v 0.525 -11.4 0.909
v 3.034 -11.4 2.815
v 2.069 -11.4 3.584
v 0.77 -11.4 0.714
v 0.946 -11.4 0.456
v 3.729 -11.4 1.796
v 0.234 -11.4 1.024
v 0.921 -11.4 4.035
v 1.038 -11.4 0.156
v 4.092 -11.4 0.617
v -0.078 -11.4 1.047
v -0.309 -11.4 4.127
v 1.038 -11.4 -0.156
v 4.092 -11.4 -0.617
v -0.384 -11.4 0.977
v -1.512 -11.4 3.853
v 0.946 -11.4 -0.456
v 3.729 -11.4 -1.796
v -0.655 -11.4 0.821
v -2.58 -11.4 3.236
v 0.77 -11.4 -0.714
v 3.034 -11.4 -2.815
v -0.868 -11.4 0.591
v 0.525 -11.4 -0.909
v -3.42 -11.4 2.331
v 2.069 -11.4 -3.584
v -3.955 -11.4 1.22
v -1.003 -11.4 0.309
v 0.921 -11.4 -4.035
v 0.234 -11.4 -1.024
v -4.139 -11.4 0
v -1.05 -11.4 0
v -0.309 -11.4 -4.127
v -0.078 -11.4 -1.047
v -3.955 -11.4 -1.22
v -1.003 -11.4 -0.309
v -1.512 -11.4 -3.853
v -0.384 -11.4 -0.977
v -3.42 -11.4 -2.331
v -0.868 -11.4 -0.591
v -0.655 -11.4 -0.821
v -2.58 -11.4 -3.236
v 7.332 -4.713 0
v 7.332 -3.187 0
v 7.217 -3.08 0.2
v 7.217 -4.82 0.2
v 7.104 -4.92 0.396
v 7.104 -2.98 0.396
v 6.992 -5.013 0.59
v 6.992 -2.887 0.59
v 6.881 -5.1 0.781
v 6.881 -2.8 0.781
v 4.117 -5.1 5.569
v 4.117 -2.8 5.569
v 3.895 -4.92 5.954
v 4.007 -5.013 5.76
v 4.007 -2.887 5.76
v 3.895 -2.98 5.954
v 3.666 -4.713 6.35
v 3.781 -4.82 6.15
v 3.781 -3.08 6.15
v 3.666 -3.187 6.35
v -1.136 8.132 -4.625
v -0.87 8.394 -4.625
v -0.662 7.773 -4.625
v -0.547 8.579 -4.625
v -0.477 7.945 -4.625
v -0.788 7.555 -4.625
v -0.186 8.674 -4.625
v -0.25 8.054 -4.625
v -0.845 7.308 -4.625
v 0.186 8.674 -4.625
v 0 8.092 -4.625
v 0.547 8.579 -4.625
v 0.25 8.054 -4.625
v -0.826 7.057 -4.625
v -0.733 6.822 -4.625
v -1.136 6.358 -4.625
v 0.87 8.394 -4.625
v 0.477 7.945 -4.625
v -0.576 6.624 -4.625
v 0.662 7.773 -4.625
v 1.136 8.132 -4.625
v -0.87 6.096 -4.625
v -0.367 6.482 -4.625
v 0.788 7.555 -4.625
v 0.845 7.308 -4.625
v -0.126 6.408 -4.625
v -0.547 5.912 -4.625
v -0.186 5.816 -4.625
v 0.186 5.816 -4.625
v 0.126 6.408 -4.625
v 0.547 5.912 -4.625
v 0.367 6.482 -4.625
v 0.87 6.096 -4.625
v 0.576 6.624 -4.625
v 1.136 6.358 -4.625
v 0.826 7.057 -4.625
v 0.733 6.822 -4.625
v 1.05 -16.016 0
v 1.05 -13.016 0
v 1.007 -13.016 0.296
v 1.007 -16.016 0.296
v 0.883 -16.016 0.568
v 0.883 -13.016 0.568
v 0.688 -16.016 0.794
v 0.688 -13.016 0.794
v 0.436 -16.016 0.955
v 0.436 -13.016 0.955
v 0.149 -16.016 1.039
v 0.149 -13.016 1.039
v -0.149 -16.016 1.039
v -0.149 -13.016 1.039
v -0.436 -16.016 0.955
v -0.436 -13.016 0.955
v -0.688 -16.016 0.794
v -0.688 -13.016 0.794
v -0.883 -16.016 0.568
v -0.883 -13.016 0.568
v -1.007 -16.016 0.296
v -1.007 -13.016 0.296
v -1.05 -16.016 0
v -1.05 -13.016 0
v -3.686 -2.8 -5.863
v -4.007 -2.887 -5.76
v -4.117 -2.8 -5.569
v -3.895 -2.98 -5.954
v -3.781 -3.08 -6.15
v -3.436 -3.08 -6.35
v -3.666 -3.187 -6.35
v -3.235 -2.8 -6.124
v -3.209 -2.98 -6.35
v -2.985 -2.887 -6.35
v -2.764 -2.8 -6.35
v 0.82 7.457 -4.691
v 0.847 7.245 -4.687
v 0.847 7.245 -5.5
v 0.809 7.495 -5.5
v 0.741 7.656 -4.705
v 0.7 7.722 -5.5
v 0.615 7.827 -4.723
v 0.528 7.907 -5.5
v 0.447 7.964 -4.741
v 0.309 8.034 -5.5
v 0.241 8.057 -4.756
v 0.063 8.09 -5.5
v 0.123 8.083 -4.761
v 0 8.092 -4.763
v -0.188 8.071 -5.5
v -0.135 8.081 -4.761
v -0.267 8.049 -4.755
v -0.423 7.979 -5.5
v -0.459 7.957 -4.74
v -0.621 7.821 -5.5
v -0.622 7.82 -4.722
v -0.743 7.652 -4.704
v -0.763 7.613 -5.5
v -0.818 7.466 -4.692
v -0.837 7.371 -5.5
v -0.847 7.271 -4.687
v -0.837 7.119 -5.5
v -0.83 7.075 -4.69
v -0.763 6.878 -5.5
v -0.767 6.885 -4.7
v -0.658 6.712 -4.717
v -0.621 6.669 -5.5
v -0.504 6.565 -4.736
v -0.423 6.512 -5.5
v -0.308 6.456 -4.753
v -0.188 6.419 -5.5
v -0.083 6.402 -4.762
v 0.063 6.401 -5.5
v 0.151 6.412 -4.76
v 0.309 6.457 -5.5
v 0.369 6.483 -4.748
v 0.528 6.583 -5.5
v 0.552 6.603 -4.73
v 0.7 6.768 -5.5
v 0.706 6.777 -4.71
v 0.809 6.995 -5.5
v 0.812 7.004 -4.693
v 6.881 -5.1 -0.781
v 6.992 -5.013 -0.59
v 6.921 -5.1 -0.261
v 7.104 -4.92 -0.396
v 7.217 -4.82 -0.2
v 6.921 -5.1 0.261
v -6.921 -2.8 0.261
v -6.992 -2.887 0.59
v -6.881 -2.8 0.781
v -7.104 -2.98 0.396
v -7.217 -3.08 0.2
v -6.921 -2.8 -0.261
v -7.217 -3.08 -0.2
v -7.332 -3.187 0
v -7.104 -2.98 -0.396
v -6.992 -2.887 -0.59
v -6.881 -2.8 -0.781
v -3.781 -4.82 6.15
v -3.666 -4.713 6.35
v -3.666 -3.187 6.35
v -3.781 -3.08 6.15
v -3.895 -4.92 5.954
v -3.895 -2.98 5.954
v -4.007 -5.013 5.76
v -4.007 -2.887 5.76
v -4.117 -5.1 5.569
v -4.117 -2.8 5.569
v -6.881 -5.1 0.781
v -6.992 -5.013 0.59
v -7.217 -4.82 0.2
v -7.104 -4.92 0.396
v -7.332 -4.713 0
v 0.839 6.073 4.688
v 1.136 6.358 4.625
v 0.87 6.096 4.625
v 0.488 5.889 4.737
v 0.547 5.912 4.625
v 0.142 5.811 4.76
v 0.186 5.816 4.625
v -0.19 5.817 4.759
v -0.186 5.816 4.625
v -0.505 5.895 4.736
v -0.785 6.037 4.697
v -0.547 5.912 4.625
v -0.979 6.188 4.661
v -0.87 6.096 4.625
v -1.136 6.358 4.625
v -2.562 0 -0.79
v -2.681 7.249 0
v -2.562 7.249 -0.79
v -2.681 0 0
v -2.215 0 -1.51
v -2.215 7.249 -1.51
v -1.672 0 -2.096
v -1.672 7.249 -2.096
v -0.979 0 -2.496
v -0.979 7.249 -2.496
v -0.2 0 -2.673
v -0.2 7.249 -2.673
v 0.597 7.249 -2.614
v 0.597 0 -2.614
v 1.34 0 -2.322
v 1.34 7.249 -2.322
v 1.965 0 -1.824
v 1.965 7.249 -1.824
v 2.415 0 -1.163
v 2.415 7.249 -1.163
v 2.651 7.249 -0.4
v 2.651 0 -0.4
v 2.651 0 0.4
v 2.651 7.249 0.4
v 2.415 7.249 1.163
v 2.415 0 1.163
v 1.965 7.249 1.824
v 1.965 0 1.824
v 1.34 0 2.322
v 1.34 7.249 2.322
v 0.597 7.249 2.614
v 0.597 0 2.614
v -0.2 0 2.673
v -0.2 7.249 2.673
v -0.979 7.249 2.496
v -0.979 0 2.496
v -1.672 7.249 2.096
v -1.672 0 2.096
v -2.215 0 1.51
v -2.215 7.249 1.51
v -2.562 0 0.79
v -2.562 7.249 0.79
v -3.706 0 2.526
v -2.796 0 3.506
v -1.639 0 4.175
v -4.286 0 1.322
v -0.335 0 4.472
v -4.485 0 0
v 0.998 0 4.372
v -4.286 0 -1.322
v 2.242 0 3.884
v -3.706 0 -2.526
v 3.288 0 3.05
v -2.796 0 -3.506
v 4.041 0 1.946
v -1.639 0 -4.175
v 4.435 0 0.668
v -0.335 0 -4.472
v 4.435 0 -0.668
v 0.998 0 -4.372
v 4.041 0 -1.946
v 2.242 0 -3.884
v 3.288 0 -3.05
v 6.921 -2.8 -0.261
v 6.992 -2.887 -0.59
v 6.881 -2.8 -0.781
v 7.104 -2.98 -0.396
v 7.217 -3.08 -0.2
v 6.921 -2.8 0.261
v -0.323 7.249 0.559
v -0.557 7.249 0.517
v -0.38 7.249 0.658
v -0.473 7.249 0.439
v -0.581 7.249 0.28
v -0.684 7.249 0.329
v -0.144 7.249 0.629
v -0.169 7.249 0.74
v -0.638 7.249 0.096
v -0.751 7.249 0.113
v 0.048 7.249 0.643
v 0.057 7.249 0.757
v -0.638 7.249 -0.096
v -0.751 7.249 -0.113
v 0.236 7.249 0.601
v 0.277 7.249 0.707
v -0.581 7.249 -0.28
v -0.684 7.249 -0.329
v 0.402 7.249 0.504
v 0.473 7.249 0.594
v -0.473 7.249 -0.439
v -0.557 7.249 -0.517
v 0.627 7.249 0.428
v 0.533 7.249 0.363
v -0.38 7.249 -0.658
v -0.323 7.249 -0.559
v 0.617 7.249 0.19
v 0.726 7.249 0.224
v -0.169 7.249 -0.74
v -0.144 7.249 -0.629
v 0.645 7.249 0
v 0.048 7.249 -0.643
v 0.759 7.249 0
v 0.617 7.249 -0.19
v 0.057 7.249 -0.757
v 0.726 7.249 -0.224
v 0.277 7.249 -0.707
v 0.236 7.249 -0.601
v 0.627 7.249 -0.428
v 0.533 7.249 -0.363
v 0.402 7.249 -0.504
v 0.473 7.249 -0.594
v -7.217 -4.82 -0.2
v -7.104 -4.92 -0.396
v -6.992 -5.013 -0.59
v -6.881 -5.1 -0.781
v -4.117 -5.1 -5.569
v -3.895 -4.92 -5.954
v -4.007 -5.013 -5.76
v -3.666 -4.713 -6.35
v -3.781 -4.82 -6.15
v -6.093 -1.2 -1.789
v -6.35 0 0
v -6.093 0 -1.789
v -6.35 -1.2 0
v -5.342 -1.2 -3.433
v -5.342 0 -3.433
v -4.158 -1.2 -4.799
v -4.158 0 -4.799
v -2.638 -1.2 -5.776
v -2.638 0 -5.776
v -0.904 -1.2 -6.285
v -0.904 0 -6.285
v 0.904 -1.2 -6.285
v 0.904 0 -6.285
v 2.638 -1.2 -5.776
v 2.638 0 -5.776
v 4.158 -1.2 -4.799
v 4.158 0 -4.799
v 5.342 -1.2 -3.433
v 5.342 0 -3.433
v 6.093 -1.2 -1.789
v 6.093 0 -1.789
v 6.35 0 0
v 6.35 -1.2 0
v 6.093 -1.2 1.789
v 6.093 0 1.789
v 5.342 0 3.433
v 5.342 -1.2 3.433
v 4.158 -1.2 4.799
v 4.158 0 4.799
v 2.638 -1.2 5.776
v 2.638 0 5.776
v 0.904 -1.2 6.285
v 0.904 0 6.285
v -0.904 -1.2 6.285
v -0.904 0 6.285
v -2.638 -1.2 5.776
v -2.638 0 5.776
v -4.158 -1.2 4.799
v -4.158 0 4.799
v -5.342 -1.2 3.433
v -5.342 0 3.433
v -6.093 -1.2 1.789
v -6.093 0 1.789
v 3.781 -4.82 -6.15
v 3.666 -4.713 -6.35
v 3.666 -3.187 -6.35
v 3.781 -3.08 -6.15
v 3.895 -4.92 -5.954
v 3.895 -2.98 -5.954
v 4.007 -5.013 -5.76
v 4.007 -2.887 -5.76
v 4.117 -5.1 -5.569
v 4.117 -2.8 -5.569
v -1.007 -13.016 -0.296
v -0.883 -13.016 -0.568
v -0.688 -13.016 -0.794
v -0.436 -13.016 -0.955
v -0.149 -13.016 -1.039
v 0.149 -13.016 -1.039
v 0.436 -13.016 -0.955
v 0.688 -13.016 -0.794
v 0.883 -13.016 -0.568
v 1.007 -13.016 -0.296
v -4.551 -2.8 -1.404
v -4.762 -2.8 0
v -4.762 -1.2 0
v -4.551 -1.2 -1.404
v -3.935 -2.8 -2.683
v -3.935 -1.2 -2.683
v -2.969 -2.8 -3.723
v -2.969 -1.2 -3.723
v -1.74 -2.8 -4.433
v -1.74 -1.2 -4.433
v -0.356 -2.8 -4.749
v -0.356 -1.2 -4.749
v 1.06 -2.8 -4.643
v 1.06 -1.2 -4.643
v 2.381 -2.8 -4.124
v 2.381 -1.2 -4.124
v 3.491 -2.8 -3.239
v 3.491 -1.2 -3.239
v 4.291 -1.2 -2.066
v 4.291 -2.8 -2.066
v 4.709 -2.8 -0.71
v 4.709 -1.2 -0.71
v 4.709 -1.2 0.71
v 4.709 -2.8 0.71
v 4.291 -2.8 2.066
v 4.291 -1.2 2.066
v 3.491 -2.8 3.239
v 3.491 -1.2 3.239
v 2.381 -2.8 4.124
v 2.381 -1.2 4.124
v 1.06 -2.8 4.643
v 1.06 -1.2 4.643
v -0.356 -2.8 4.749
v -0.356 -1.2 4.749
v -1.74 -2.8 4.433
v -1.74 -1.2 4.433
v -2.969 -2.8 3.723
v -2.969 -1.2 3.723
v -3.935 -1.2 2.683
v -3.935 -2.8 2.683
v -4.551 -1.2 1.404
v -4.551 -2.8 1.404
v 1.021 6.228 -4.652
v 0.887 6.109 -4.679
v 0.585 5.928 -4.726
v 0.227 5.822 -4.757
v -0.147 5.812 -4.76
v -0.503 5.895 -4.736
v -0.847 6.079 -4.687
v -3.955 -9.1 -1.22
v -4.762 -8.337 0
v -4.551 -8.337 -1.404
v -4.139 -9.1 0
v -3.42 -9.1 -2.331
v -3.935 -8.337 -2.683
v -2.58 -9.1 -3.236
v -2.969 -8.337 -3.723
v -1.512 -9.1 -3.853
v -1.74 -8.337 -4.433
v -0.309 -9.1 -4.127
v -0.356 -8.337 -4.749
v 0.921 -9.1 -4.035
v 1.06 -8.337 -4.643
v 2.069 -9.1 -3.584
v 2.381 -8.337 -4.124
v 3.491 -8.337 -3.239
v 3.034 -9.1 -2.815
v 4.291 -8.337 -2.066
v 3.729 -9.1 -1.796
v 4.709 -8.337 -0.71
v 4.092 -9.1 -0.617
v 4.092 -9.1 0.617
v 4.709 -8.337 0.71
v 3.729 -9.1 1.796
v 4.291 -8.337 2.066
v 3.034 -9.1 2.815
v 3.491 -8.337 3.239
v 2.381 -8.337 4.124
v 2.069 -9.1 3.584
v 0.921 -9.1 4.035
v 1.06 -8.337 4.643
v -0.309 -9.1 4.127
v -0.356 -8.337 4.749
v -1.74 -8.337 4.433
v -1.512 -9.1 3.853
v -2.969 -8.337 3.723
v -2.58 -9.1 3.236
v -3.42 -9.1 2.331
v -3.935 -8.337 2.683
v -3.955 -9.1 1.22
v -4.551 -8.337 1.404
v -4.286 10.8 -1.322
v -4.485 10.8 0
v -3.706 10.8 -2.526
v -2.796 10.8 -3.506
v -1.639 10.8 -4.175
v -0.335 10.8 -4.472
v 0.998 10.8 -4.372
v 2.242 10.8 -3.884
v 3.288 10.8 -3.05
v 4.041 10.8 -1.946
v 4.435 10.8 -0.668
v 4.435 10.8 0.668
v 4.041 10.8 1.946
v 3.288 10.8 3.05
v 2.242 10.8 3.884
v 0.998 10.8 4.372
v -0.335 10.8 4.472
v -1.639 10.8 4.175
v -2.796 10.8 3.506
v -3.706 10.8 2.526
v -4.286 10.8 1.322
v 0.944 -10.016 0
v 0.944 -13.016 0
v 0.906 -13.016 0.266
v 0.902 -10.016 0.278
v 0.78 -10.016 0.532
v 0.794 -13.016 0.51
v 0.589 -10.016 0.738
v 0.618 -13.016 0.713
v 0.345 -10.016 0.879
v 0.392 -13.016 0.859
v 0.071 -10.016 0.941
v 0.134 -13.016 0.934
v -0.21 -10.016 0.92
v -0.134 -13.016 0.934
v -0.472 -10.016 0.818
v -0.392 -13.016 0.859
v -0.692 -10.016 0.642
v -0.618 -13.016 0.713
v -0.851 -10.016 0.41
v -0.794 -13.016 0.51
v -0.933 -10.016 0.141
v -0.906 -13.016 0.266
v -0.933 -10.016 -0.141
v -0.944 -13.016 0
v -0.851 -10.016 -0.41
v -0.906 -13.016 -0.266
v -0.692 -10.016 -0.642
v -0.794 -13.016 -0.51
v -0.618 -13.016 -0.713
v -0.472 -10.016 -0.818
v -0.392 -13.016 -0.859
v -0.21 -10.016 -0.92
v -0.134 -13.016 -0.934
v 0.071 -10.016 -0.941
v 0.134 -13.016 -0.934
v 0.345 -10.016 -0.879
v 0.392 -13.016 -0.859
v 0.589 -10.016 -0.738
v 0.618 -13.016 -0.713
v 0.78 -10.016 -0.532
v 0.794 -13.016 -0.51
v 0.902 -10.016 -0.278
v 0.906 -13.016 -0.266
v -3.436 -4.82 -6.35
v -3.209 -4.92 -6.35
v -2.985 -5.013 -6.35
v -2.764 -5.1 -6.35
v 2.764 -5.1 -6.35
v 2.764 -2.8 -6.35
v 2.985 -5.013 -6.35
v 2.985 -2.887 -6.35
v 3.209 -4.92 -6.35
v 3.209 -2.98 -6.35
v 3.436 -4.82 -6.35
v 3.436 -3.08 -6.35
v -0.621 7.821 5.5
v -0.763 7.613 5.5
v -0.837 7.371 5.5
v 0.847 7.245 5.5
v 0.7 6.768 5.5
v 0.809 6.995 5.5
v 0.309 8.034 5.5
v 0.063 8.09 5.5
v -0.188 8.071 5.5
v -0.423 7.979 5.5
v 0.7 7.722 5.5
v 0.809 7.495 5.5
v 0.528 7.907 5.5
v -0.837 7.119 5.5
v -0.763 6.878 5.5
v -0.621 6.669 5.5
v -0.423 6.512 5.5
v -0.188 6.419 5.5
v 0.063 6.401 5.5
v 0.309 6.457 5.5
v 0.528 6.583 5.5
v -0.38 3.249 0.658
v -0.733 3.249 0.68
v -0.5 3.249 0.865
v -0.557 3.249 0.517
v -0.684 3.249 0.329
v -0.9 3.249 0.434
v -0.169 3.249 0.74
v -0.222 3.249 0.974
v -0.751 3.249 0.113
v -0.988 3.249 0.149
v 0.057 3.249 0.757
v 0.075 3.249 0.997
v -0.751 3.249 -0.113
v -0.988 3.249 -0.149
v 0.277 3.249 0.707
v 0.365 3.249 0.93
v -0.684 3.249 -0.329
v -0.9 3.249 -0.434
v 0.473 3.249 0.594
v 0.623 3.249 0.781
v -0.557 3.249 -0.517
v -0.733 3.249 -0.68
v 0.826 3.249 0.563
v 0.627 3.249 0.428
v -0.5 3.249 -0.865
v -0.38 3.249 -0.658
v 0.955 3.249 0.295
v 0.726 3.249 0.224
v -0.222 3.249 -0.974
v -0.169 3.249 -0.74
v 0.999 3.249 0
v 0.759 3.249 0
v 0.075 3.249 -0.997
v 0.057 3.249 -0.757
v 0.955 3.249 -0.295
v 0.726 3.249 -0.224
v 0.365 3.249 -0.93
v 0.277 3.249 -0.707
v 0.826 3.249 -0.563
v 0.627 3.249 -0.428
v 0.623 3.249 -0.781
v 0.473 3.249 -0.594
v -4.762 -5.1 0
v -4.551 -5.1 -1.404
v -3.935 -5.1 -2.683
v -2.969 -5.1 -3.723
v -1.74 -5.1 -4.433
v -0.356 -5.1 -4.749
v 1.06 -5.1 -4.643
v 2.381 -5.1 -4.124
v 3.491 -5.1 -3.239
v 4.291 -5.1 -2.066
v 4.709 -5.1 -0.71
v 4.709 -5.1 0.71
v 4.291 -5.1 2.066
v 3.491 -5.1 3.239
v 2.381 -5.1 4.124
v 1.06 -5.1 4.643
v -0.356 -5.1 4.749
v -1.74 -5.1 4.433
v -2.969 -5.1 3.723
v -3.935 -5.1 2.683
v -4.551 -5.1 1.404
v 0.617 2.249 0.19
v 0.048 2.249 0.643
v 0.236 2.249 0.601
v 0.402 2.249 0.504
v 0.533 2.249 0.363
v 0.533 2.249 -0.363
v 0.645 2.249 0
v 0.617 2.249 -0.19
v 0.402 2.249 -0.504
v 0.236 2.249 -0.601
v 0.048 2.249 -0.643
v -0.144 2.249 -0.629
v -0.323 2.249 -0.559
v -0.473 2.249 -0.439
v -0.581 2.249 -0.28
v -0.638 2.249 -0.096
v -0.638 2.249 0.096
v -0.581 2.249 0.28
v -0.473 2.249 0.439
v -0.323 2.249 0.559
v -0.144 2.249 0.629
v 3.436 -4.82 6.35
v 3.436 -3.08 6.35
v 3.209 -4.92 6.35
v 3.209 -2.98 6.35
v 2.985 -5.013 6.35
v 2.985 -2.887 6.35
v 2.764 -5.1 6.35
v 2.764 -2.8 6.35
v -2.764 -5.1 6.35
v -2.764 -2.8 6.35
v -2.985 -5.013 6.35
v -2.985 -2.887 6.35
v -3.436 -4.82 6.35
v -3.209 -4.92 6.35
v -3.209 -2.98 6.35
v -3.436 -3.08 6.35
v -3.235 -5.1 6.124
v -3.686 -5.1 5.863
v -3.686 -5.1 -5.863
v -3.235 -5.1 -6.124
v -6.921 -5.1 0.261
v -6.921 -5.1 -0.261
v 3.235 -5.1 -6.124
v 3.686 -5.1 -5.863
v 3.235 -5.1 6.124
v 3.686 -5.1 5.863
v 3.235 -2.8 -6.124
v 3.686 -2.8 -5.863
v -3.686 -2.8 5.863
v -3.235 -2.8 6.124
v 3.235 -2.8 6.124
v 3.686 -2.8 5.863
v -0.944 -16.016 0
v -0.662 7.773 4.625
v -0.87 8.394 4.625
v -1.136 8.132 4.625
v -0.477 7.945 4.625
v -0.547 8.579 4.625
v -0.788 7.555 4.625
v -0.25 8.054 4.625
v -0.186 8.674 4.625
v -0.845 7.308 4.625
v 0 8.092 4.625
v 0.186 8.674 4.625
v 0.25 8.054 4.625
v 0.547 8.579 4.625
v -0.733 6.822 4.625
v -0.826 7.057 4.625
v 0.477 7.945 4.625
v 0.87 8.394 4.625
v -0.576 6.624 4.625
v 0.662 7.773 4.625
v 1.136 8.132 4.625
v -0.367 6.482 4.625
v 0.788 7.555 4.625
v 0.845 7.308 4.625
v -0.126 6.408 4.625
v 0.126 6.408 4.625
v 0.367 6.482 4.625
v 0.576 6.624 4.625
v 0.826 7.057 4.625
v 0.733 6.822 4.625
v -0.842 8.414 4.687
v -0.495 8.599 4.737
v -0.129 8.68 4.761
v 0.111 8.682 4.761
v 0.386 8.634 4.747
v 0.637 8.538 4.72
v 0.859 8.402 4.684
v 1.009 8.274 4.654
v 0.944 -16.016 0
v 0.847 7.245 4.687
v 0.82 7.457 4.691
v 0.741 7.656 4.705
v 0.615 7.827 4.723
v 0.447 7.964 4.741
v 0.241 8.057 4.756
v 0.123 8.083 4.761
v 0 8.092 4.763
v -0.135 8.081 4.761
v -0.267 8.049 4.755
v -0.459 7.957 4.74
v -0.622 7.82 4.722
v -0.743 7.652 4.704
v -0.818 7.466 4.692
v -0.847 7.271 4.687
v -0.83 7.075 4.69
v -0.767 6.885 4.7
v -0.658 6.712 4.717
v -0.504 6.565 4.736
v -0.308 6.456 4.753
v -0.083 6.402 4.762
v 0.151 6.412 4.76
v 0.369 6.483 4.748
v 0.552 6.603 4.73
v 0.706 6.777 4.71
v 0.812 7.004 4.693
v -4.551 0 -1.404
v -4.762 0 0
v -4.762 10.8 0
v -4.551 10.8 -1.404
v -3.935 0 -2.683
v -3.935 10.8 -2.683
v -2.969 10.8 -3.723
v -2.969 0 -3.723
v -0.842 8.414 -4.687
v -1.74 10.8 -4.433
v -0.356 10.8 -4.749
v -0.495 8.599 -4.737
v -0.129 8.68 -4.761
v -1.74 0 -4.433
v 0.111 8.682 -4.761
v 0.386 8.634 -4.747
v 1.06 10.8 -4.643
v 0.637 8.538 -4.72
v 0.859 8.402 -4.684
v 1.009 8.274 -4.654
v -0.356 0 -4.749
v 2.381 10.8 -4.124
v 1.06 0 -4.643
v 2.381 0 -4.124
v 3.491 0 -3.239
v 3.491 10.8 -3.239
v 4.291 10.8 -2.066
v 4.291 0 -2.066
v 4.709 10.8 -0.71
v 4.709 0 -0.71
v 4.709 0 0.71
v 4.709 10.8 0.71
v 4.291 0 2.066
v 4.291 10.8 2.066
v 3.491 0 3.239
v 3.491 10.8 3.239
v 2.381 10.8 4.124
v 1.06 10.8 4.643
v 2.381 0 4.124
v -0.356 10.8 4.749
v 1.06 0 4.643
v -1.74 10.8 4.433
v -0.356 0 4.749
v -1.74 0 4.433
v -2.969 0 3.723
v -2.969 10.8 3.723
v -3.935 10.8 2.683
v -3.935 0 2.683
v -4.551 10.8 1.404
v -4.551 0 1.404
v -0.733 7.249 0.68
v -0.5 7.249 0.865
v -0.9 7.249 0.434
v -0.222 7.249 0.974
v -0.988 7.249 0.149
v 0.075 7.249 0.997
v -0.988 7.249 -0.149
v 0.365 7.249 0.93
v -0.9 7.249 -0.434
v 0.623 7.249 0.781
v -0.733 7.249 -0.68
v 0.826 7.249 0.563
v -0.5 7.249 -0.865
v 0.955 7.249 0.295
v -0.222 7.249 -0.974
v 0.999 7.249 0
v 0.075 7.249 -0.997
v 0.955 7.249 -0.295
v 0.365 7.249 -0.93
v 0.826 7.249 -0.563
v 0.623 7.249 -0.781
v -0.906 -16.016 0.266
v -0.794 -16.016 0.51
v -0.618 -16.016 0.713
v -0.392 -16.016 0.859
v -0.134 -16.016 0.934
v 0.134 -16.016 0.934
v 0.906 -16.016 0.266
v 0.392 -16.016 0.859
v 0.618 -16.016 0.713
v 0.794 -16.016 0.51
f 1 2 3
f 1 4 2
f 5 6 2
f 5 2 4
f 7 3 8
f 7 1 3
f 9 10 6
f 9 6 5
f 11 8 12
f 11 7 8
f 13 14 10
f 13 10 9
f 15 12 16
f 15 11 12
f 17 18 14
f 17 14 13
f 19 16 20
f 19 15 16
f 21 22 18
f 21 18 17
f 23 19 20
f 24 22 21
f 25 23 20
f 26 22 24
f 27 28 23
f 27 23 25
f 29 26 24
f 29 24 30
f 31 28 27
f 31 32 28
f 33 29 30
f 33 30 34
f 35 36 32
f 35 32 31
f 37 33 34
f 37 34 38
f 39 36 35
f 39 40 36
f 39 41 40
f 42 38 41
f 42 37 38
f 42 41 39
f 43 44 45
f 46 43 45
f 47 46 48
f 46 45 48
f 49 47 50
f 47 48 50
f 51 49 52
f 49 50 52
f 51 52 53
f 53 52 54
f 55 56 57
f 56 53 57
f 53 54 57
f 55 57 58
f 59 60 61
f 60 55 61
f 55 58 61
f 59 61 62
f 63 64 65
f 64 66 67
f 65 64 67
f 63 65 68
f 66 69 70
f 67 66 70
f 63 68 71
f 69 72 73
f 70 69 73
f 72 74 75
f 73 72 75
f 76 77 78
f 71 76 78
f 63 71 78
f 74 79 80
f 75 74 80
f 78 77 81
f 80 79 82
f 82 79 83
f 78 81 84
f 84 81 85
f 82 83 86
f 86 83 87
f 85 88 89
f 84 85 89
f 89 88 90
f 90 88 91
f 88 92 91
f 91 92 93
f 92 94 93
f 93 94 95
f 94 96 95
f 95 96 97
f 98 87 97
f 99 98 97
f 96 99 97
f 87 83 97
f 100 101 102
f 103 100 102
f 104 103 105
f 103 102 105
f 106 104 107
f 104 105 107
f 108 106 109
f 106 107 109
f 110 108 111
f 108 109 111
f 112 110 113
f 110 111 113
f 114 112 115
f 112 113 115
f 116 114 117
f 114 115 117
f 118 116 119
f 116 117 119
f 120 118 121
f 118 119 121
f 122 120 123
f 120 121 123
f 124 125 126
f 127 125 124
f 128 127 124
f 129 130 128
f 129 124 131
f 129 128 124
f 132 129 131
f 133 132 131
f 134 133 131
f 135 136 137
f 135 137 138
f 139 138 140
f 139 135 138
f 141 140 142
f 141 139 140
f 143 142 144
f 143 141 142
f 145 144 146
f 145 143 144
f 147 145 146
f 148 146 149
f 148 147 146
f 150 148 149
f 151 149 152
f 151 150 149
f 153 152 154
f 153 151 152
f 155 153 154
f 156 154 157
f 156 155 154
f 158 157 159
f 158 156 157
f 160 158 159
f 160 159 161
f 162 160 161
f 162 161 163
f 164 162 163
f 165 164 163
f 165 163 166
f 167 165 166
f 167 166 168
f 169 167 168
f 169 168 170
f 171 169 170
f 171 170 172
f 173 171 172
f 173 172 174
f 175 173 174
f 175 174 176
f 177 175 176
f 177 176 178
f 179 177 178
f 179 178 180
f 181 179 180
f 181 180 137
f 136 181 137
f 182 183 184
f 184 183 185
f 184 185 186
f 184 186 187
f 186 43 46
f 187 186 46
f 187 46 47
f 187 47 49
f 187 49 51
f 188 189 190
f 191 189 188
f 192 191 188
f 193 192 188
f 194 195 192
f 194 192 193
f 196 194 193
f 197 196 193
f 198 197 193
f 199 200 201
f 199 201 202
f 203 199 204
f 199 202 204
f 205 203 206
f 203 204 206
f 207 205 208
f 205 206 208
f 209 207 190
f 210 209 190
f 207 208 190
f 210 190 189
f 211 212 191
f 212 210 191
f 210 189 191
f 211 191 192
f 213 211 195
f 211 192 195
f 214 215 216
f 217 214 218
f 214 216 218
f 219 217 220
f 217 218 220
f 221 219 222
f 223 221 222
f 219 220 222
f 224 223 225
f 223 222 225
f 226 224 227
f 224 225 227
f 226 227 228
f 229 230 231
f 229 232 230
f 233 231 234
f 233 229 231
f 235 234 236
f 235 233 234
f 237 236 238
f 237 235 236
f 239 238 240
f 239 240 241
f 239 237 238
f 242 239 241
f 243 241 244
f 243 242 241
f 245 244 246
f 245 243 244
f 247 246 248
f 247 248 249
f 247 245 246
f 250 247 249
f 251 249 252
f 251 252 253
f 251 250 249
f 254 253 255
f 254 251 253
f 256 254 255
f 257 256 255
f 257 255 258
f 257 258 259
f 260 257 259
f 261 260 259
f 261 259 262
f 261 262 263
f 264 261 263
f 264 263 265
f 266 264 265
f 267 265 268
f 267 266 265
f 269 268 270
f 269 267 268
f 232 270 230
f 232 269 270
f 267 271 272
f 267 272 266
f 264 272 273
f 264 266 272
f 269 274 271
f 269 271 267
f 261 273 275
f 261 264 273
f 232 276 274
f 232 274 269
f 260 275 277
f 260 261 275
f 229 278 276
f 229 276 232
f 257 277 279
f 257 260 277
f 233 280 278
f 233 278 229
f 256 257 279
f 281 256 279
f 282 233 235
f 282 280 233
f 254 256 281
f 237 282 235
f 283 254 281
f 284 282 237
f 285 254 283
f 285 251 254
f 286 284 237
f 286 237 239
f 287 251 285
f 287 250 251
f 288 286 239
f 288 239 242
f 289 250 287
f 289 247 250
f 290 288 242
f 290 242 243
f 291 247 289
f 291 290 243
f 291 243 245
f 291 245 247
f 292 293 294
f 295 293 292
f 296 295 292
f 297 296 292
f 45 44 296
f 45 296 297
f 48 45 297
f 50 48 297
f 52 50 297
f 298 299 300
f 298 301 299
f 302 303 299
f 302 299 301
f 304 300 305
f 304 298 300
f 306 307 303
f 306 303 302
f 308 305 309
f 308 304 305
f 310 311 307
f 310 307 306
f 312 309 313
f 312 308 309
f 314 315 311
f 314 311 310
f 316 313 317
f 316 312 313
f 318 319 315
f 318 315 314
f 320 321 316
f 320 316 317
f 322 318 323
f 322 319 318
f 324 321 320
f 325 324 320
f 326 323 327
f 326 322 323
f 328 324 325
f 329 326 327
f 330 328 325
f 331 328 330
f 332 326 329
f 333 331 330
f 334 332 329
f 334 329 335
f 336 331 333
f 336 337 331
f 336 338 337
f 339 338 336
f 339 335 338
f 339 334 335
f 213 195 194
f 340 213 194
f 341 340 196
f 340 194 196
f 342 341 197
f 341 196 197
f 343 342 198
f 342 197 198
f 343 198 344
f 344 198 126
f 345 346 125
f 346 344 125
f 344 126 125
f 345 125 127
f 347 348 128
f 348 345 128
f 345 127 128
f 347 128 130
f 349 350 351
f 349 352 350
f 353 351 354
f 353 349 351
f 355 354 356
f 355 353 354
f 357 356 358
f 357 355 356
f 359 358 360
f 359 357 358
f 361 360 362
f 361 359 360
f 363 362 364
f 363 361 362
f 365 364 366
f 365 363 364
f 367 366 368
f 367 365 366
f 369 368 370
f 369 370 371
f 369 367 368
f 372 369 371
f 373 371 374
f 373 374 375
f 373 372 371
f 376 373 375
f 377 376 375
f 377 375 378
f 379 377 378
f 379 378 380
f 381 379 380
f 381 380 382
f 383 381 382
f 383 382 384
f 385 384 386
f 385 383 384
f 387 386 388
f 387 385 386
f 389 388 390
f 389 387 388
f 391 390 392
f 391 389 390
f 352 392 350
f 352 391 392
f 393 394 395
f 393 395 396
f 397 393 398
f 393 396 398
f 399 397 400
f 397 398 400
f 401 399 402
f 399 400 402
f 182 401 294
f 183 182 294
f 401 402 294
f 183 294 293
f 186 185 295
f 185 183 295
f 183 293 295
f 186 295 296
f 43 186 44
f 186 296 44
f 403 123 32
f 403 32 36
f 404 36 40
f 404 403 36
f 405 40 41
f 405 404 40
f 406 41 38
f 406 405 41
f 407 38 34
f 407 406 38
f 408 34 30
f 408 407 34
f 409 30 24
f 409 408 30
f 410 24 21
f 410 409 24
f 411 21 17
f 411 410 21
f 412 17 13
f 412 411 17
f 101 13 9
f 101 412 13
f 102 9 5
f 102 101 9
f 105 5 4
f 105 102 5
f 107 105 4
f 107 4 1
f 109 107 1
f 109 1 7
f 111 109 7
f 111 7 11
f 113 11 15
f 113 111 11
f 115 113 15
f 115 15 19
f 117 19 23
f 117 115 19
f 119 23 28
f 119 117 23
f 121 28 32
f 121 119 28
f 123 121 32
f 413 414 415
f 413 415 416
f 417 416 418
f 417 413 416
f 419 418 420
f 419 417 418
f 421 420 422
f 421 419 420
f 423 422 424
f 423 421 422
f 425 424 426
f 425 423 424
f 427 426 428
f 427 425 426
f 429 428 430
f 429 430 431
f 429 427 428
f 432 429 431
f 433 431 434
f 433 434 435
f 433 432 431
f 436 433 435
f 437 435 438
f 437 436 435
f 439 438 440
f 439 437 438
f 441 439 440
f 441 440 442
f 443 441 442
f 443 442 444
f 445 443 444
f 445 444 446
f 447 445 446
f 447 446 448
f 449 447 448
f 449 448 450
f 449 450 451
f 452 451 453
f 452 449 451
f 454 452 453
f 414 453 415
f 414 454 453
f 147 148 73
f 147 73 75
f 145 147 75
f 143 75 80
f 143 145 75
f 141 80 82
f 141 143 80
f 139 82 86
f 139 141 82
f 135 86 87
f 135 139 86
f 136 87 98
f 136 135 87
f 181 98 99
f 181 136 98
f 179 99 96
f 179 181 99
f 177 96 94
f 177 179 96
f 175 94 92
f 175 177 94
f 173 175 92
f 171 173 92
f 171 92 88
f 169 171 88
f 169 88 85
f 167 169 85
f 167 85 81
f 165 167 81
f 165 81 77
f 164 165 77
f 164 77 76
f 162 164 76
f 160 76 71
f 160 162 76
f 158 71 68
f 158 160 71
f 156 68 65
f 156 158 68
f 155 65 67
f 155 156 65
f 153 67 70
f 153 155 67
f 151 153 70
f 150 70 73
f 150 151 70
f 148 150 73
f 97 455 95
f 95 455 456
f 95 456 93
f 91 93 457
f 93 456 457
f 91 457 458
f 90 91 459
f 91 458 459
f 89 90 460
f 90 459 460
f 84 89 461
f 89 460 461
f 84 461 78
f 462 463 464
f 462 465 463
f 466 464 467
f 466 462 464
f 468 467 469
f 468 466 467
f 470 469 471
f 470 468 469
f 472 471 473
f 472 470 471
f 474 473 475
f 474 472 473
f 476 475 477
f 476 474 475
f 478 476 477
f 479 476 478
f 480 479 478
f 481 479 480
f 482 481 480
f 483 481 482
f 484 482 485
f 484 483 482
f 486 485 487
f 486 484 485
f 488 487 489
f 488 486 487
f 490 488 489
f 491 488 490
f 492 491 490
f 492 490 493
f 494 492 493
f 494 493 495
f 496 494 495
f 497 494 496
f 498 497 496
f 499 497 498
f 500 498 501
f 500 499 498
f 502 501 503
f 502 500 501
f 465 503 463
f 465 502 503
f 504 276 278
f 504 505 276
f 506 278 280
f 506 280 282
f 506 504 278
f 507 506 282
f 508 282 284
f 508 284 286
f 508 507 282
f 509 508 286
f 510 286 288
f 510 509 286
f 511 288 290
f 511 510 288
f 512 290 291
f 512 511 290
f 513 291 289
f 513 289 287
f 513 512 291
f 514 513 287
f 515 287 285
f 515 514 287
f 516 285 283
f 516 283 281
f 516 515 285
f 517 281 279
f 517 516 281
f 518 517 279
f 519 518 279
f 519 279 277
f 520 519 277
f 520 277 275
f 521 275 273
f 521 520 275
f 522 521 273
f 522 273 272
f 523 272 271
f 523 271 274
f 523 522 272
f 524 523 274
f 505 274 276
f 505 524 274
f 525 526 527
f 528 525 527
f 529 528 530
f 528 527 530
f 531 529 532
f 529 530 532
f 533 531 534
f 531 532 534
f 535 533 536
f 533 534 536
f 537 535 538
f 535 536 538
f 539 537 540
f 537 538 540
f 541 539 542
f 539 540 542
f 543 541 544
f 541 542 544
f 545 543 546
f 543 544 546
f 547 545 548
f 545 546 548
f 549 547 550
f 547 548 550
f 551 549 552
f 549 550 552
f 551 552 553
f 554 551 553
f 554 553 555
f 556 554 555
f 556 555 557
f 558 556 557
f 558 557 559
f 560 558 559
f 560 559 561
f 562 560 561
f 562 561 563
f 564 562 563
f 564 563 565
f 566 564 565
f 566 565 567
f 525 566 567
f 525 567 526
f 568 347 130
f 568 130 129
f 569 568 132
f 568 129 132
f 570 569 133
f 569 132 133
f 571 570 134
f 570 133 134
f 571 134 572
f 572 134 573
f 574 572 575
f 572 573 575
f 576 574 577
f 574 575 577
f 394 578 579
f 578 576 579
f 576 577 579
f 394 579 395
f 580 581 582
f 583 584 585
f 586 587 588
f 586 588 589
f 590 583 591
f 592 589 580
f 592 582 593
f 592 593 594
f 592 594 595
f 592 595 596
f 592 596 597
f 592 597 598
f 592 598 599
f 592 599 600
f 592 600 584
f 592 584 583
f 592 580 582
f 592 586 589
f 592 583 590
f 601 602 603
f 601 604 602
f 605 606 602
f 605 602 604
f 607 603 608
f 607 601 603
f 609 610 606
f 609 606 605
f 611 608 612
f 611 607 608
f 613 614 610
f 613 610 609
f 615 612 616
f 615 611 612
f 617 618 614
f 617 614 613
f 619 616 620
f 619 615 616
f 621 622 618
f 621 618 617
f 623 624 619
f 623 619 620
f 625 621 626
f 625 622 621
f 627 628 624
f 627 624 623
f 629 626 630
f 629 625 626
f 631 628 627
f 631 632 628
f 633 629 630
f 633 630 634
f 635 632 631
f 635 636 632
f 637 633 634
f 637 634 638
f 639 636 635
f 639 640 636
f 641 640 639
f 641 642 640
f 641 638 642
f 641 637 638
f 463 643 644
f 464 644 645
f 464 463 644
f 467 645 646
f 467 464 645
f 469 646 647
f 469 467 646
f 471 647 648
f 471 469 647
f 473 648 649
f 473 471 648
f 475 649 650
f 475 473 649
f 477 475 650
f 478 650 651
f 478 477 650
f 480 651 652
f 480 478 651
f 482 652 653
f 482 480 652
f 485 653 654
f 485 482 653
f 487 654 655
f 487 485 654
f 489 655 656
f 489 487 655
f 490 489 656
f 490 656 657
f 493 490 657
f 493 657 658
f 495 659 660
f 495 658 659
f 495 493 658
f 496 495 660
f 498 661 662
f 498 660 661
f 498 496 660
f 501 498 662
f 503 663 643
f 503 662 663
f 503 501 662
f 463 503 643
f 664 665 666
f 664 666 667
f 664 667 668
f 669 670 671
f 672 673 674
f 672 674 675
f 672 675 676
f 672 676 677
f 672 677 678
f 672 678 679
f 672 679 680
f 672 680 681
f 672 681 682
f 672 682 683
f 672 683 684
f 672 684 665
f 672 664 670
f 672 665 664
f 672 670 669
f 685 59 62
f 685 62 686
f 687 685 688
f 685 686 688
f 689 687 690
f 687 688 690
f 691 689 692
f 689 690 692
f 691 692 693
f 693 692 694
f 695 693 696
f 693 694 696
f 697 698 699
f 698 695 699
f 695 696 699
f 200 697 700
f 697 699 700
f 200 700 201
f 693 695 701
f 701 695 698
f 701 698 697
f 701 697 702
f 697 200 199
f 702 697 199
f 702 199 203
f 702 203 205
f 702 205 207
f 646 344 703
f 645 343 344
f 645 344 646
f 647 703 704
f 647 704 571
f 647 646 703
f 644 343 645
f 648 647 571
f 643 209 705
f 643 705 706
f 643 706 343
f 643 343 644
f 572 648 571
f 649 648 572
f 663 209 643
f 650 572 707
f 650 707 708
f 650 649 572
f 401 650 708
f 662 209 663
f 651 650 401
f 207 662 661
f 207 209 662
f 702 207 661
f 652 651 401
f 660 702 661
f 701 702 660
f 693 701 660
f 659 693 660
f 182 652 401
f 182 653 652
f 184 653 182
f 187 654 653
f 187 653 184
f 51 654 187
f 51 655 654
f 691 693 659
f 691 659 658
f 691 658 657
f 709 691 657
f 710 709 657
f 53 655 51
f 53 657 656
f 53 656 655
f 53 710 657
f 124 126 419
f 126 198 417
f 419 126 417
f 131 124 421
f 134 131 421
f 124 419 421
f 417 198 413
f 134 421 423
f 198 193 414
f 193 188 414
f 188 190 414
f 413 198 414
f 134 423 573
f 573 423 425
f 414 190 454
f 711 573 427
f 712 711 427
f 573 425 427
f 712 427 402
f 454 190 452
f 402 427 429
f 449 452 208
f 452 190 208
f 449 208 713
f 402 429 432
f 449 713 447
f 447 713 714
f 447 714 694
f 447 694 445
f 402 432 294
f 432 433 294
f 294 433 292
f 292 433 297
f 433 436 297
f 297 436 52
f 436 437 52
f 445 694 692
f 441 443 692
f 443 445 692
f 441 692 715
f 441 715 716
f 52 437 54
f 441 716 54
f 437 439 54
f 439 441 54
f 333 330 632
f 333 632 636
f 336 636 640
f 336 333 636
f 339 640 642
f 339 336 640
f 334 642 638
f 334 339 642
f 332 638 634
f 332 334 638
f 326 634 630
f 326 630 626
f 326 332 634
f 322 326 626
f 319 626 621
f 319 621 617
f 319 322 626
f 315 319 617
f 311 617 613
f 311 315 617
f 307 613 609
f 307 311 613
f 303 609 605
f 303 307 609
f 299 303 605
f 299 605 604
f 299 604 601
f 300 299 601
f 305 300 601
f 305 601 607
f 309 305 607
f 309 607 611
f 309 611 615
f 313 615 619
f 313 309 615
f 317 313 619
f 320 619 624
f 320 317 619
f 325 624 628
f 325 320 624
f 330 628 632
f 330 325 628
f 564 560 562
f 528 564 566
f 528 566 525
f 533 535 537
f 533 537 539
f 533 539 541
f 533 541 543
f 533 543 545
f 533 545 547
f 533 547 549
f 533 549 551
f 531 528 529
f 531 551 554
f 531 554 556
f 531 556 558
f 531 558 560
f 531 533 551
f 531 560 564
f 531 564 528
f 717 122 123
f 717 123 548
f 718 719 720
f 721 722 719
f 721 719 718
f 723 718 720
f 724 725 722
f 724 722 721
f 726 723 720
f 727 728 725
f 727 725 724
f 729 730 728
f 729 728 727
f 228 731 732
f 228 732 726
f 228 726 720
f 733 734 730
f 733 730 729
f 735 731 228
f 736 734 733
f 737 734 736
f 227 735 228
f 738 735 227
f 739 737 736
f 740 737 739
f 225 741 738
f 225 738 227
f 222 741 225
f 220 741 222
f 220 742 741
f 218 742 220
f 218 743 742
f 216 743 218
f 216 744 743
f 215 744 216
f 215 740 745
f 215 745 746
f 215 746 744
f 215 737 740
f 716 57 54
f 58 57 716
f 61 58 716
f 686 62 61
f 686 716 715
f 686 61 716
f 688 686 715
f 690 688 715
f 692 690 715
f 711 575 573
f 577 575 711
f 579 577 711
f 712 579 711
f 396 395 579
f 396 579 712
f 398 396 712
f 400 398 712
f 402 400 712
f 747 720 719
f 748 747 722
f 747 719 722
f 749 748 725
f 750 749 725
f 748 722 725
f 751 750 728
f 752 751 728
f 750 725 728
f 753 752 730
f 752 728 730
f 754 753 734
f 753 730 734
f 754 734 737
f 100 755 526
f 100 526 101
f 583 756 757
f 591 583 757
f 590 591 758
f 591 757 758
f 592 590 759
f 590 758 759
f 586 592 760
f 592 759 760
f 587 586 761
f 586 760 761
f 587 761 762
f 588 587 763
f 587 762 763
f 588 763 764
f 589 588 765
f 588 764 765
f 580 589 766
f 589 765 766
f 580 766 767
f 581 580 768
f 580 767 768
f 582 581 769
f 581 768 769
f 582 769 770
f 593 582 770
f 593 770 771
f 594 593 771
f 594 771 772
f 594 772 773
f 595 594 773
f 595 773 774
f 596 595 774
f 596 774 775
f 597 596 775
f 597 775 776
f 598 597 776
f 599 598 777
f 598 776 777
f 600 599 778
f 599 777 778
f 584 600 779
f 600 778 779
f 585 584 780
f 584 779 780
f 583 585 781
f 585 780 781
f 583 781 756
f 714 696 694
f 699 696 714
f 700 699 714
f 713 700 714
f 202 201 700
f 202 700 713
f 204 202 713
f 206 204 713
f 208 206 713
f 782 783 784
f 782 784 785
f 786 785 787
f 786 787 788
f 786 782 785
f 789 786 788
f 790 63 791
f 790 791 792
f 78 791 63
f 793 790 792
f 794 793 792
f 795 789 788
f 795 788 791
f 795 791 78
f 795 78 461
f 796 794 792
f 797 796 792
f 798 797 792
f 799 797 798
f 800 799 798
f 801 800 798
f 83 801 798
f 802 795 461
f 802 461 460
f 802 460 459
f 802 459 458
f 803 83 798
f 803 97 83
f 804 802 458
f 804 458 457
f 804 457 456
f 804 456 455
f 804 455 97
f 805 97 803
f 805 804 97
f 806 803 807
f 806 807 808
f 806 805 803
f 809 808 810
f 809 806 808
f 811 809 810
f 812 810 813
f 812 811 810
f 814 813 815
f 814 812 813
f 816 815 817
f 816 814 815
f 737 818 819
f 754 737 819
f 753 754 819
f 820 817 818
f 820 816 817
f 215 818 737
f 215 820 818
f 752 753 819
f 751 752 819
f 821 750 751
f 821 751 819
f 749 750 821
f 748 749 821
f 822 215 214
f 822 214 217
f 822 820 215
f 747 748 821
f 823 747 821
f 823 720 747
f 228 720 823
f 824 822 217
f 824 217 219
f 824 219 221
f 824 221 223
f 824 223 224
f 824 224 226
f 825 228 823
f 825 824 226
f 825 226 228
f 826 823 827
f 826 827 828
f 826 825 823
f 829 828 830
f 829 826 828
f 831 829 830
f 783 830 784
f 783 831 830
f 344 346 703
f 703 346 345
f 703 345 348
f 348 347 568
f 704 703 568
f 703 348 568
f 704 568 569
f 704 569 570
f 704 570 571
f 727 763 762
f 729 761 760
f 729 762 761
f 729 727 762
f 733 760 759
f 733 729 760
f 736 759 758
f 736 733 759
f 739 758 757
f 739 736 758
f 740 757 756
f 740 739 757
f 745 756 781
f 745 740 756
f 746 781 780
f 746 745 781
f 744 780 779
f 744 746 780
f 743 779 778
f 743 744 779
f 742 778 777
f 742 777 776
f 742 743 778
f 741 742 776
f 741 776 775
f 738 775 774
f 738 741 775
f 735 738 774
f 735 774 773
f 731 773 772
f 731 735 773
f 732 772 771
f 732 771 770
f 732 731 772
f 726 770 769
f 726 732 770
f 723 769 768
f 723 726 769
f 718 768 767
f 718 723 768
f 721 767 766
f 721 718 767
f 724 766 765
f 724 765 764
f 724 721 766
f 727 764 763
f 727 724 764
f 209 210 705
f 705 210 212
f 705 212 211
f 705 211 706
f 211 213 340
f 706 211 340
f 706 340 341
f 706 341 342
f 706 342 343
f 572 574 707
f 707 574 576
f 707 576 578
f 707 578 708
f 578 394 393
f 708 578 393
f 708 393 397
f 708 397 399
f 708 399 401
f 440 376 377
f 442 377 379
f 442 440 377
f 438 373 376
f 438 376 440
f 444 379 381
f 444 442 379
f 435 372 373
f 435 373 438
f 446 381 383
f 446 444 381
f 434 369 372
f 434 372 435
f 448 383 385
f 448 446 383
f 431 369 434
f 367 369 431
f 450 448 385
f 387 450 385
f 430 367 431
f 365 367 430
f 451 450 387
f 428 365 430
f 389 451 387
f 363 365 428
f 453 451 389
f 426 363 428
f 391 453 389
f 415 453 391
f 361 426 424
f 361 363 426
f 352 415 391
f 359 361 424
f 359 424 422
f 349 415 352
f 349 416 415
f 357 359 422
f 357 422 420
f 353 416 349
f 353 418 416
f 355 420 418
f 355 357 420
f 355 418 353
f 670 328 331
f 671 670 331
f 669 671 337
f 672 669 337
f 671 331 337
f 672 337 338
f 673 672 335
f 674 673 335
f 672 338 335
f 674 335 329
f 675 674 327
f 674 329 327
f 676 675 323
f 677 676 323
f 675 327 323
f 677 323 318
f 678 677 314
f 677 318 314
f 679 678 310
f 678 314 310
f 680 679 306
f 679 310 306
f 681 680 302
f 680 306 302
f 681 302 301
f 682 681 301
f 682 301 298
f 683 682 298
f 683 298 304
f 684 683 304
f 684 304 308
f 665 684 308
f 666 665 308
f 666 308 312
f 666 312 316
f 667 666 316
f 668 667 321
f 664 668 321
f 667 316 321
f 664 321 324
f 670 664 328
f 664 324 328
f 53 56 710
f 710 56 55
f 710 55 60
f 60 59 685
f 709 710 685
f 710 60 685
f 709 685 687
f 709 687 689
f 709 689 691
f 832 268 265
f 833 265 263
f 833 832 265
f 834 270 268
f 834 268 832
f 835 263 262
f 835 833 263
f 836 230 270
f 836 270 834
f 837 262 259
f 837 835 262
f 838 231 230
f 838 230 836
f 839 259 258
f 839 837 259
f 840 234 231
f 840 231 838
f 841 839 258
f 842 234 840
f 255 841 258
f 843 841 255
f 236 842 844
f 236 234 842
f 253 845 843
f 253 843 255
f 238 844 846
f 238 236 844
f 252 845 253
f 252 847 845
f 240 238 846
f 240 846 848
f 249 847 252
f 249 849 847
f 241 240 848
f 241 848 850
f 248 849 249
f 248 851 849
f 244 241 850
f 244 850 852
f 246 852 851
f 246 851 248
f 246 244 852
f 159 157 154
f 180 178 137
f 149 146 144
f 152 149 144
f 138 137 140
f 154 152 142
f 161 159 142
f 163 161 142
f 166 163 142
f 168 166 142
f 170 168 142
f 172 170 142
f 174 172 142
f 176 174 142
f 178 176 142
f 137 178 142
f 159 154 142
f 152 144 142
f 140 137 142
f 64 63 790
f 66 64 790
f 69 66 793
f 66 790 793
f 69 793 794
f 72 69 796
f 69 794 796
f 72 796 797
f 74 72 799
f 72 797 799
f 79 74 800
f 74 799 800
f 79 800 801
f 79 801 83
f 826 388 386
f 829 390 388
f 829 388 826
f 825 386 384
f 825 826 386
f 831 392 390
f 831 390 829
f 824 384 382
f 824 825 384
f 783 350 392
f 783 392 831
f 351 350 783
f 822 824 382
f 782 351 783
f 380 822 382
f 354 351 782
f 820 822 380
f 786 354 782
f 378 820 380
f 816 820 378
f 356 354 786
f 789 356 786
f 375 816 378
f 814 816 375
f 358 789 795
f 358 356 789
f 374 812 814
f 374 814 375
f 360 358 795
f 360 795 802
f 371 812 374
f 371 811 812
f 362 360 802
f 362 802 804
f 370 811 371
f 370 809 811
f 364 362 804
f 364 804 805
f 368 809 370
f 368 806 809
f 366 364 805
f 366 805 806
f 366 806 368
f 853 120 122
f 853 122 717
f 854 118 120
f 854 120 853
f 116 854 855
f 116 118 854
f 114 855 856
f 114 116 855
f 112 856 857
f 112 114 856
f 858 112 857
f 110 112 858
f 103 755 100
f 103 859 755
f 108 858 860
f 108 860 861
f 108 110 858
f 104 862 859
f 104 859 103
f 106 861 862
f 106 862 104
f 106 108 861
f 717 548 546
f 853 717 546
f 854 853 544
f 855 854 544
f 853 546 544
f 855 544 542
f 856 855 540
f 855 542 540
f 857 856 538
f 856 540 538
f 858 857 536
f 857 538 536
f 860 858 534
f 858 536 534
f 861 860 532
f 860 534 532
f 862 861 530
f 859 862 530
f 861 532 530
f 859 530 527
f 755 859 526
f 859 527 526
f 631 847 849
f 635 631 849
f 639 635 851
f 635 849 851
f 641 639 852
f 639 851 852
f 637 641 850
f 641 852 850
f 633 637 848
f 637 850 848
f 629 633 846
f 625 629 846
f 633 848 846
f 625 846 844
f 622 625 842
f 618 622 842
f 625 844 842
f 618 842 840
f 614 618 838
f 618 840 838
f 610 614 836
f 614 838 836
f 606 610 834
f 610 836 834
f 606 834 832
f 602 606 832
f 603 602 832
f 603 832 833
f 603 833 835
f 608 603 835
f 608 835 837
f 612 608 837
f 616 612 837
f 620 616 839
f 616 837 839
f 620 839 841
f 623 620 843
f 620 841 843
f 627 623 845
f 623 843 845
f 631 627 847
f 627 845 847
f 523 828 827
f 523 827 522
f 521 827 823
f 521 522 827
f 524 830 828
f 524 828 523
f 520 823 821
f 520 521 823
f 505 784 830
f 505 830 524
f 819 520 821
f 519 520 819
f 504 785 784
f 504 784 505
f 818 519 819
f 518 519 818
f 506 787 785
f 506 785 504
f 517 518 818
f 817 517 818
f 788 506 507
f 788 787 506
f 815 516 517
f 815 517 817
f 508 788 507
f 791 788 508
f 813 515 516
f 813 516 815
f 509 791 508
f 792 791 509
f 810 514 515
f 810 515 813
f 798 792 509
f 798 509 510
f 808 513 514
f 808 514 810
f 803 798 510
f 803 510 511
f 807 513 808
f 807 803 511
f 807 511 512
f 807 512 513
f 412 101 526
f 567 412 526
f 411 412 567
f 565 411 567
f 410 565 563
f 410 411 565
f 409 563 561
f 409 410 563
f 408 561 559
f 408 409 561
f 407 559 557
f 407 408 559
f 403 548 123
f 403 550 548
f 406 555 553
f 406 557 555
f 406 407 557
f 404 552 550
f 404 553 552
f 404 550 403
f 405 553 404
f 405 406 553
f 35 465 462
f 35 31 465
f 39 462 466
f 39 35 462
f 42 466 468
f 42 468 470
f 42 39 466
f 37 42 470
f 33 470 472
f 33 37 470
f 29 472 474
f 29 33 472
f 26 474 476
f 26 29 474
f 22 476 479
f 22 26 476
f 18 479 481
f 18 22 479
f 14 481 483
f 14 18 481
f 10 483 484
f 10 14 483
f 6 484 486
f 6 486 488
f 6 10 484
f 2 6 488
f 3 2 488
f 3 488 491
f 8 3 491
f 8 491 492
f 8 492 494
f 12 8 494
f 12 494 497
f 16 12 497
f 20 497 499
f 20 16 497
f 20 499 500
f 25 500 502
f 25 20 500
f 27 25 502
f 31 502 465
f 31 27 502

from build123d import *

# Parameters (mm, degrees)
BOSS_EXTRUDE1_START = 1.6
SKETCH2_R           = 4.7625
BOSS_EXTRUDE1_DEPTH = 2.3
BOSS_EXTRUDE2_START = 4.5
SKETCH5_R           = 0.846945363
BOSS_EXTRUDE2_DEPTH = 1
SKETCH6_R           = 0.645187132
CUT_EXTRUDE1_DEPTH  = 5
SKETCH9_W           = 0.137399245
SKETCH9_H           = 0.594121804
BOSS_EXTRUDE3_DEPTH = 3
SKETCH11_R          = 0.94402027
CUT_EXTRUDE2_DEPTH  = 3
SKETCH13_R          = 0.99938664
SKETCH13_R_2        = 0.759397748
CUT_EXTRUDE4_DEPTH  = 4


with BuildPart() as part:
    # Sketch1 → Revolve1 (revolve)
    with BuildSketch(Plane.XY):
        Polygon((0, 7.249356935), (-2.68096621, 7.249356935), (-2.68096621, 0), (-4.484856827, 0), (-4.484856827, 10.8), (-4.7625, 10.8), (-4.7625, 0), (-6.35, 0), (-6.35, -1.2), (-4.7625, -1.2), (-4.7625, -8.33684753), (-4.138651138, -9.1), (-4.138651138, -11.4), (-1.05, -11.4), (-1.05, -13.015612484), (0, -13.015612484), align=None)
    revolve(axis=Axis((0, 72.402332312, 0), (0, -1, 0)))

    # Sketch2 → Boss-Extrude1 (add)
    with BuildSketch(Plane.XZ.offset(1.2).offset(BOSS_EXTRUDE1_START)):
        Polygon((3.666174209, -6.35), (7.332348419, 0), (3.666174209, 6.35), (-3.666174209, 6.35), (-7.332348419, 0), (-3.666174209, -6.35), align=None)
        Circle(SKETCH2_R, mode=Mode.SUBTRACT)
    extrude(amount=BOSS_EXTRUDE1_DEPTH)

    # Sketch4 → Cut-Revolve1 (revolve, cut)
    with BuildSketch(Plane.XY):
        Polygon((-6.925646916, -2.8), (-7.332348419, -3.186501065), (-8.999279983, -3.186501065), (-8.361056601, -0.327260314), (-6.925646916, 0.349979738), align=None)
        Polygon((-6.925646916, -8.249979738), (-6.925646916, -5.1), (-7.332348419, -4.713498935), (-8.999279983, -4.713498935), (-8.361056601, -7.572739686), align=None)
    revolve(axis=Axis((0, 10.8, 0), (0, -1, 0)), mode=Mode.SUBTRACT)

    # Sketch5 → Boss-Extrude2 (add)
    with BuildSketch(Plane.XY.offset(BOSS_EXTRUDE2_START)):
        with Locations((0, 7.245112304)):
            Circle(SKETCH5_R)
    boss_extrude2 = extrude(amount=BOSS_EXTRUDE2_DEPTH)

    # Mirror1: Boss-Extrude2 across plane
    add(boss_extrude2.mirror(Plane.XY))

    # Sketch6 → Cut-Extrude1 (cut)
    with BuildSketch(Plane(origin=(0, 7.249356935, 0), x_dir=(1, 0, 0), z_dir=(0, 1, 0))):
        Circle(SKETCH6_R)
    extrude(amount=-CUT_EXTRUDE1_DEPTH, mode=Mode.SUBTRACT)

    # Sketch9 → Cut-Revolve2 (revolve, cut)
    with BuildSketch(Plane(origin=(0, 0, 0), x_dir=(0, 0, -1), z_dir=(1, 0, 0))):
        with Locations((4.693800378, 8.389118569)):
            Rectangle(SKETCH9_W, SKETCH9_H)
        with Locations((-4.693800378, 8.389118569)):
            Rectangle(SKETCH9_W, SKETCH9_H)
    revolve(axis=Axis((0, 7.245112304, 5.5), (0, 0, -1)), mode=Mode.SUBTRACT)

    # Sketch10 → Boss-Extrude3 (add)
    with BuildSketch(Plane.XZ.offset(13.015612484)):
        with BuildLine():
            Line((0.94402027, 0), (1.05, 0))
            ThreePointArc((1.05, 0), (0, 1.05), (-1.05, 0))
            Line((-1.05, 0), (-0.94402027, 0))
            ThreePointArc((-0.94402027, 0), (0, 0.94402027), (0.94402027, 0))
        make_face()
    extrude(amount=BOSS_EXTRUDE3_DEPTH)

    # Sketch11 → Cut-Extrude2 (cut)
    with BuildSketch(Plane.XZ.offset(13.015612484)):
        Circle(SKETCH11_R)
    extrude(amount=-CUT_EXTRUDE2_DEPTH, mode=Mode.SUBTRACT)

    # Sketch13 → Cut-Extrude4 (cut)
    with BuildSketch(Plane(origin=(0, 7.249356935, 0), x_dir=(1, 0, 0), z_dir=(0, 1, 0))):
        Circle(SKETCH13_R)
        Circle(SKETCH13_R_2, mode=Mode.SUBTRACT)
    extrude(amount=-CUT_EXTRUDE4_DEPTH, mode=Mode.SUBTRACT)


solid = part.part
